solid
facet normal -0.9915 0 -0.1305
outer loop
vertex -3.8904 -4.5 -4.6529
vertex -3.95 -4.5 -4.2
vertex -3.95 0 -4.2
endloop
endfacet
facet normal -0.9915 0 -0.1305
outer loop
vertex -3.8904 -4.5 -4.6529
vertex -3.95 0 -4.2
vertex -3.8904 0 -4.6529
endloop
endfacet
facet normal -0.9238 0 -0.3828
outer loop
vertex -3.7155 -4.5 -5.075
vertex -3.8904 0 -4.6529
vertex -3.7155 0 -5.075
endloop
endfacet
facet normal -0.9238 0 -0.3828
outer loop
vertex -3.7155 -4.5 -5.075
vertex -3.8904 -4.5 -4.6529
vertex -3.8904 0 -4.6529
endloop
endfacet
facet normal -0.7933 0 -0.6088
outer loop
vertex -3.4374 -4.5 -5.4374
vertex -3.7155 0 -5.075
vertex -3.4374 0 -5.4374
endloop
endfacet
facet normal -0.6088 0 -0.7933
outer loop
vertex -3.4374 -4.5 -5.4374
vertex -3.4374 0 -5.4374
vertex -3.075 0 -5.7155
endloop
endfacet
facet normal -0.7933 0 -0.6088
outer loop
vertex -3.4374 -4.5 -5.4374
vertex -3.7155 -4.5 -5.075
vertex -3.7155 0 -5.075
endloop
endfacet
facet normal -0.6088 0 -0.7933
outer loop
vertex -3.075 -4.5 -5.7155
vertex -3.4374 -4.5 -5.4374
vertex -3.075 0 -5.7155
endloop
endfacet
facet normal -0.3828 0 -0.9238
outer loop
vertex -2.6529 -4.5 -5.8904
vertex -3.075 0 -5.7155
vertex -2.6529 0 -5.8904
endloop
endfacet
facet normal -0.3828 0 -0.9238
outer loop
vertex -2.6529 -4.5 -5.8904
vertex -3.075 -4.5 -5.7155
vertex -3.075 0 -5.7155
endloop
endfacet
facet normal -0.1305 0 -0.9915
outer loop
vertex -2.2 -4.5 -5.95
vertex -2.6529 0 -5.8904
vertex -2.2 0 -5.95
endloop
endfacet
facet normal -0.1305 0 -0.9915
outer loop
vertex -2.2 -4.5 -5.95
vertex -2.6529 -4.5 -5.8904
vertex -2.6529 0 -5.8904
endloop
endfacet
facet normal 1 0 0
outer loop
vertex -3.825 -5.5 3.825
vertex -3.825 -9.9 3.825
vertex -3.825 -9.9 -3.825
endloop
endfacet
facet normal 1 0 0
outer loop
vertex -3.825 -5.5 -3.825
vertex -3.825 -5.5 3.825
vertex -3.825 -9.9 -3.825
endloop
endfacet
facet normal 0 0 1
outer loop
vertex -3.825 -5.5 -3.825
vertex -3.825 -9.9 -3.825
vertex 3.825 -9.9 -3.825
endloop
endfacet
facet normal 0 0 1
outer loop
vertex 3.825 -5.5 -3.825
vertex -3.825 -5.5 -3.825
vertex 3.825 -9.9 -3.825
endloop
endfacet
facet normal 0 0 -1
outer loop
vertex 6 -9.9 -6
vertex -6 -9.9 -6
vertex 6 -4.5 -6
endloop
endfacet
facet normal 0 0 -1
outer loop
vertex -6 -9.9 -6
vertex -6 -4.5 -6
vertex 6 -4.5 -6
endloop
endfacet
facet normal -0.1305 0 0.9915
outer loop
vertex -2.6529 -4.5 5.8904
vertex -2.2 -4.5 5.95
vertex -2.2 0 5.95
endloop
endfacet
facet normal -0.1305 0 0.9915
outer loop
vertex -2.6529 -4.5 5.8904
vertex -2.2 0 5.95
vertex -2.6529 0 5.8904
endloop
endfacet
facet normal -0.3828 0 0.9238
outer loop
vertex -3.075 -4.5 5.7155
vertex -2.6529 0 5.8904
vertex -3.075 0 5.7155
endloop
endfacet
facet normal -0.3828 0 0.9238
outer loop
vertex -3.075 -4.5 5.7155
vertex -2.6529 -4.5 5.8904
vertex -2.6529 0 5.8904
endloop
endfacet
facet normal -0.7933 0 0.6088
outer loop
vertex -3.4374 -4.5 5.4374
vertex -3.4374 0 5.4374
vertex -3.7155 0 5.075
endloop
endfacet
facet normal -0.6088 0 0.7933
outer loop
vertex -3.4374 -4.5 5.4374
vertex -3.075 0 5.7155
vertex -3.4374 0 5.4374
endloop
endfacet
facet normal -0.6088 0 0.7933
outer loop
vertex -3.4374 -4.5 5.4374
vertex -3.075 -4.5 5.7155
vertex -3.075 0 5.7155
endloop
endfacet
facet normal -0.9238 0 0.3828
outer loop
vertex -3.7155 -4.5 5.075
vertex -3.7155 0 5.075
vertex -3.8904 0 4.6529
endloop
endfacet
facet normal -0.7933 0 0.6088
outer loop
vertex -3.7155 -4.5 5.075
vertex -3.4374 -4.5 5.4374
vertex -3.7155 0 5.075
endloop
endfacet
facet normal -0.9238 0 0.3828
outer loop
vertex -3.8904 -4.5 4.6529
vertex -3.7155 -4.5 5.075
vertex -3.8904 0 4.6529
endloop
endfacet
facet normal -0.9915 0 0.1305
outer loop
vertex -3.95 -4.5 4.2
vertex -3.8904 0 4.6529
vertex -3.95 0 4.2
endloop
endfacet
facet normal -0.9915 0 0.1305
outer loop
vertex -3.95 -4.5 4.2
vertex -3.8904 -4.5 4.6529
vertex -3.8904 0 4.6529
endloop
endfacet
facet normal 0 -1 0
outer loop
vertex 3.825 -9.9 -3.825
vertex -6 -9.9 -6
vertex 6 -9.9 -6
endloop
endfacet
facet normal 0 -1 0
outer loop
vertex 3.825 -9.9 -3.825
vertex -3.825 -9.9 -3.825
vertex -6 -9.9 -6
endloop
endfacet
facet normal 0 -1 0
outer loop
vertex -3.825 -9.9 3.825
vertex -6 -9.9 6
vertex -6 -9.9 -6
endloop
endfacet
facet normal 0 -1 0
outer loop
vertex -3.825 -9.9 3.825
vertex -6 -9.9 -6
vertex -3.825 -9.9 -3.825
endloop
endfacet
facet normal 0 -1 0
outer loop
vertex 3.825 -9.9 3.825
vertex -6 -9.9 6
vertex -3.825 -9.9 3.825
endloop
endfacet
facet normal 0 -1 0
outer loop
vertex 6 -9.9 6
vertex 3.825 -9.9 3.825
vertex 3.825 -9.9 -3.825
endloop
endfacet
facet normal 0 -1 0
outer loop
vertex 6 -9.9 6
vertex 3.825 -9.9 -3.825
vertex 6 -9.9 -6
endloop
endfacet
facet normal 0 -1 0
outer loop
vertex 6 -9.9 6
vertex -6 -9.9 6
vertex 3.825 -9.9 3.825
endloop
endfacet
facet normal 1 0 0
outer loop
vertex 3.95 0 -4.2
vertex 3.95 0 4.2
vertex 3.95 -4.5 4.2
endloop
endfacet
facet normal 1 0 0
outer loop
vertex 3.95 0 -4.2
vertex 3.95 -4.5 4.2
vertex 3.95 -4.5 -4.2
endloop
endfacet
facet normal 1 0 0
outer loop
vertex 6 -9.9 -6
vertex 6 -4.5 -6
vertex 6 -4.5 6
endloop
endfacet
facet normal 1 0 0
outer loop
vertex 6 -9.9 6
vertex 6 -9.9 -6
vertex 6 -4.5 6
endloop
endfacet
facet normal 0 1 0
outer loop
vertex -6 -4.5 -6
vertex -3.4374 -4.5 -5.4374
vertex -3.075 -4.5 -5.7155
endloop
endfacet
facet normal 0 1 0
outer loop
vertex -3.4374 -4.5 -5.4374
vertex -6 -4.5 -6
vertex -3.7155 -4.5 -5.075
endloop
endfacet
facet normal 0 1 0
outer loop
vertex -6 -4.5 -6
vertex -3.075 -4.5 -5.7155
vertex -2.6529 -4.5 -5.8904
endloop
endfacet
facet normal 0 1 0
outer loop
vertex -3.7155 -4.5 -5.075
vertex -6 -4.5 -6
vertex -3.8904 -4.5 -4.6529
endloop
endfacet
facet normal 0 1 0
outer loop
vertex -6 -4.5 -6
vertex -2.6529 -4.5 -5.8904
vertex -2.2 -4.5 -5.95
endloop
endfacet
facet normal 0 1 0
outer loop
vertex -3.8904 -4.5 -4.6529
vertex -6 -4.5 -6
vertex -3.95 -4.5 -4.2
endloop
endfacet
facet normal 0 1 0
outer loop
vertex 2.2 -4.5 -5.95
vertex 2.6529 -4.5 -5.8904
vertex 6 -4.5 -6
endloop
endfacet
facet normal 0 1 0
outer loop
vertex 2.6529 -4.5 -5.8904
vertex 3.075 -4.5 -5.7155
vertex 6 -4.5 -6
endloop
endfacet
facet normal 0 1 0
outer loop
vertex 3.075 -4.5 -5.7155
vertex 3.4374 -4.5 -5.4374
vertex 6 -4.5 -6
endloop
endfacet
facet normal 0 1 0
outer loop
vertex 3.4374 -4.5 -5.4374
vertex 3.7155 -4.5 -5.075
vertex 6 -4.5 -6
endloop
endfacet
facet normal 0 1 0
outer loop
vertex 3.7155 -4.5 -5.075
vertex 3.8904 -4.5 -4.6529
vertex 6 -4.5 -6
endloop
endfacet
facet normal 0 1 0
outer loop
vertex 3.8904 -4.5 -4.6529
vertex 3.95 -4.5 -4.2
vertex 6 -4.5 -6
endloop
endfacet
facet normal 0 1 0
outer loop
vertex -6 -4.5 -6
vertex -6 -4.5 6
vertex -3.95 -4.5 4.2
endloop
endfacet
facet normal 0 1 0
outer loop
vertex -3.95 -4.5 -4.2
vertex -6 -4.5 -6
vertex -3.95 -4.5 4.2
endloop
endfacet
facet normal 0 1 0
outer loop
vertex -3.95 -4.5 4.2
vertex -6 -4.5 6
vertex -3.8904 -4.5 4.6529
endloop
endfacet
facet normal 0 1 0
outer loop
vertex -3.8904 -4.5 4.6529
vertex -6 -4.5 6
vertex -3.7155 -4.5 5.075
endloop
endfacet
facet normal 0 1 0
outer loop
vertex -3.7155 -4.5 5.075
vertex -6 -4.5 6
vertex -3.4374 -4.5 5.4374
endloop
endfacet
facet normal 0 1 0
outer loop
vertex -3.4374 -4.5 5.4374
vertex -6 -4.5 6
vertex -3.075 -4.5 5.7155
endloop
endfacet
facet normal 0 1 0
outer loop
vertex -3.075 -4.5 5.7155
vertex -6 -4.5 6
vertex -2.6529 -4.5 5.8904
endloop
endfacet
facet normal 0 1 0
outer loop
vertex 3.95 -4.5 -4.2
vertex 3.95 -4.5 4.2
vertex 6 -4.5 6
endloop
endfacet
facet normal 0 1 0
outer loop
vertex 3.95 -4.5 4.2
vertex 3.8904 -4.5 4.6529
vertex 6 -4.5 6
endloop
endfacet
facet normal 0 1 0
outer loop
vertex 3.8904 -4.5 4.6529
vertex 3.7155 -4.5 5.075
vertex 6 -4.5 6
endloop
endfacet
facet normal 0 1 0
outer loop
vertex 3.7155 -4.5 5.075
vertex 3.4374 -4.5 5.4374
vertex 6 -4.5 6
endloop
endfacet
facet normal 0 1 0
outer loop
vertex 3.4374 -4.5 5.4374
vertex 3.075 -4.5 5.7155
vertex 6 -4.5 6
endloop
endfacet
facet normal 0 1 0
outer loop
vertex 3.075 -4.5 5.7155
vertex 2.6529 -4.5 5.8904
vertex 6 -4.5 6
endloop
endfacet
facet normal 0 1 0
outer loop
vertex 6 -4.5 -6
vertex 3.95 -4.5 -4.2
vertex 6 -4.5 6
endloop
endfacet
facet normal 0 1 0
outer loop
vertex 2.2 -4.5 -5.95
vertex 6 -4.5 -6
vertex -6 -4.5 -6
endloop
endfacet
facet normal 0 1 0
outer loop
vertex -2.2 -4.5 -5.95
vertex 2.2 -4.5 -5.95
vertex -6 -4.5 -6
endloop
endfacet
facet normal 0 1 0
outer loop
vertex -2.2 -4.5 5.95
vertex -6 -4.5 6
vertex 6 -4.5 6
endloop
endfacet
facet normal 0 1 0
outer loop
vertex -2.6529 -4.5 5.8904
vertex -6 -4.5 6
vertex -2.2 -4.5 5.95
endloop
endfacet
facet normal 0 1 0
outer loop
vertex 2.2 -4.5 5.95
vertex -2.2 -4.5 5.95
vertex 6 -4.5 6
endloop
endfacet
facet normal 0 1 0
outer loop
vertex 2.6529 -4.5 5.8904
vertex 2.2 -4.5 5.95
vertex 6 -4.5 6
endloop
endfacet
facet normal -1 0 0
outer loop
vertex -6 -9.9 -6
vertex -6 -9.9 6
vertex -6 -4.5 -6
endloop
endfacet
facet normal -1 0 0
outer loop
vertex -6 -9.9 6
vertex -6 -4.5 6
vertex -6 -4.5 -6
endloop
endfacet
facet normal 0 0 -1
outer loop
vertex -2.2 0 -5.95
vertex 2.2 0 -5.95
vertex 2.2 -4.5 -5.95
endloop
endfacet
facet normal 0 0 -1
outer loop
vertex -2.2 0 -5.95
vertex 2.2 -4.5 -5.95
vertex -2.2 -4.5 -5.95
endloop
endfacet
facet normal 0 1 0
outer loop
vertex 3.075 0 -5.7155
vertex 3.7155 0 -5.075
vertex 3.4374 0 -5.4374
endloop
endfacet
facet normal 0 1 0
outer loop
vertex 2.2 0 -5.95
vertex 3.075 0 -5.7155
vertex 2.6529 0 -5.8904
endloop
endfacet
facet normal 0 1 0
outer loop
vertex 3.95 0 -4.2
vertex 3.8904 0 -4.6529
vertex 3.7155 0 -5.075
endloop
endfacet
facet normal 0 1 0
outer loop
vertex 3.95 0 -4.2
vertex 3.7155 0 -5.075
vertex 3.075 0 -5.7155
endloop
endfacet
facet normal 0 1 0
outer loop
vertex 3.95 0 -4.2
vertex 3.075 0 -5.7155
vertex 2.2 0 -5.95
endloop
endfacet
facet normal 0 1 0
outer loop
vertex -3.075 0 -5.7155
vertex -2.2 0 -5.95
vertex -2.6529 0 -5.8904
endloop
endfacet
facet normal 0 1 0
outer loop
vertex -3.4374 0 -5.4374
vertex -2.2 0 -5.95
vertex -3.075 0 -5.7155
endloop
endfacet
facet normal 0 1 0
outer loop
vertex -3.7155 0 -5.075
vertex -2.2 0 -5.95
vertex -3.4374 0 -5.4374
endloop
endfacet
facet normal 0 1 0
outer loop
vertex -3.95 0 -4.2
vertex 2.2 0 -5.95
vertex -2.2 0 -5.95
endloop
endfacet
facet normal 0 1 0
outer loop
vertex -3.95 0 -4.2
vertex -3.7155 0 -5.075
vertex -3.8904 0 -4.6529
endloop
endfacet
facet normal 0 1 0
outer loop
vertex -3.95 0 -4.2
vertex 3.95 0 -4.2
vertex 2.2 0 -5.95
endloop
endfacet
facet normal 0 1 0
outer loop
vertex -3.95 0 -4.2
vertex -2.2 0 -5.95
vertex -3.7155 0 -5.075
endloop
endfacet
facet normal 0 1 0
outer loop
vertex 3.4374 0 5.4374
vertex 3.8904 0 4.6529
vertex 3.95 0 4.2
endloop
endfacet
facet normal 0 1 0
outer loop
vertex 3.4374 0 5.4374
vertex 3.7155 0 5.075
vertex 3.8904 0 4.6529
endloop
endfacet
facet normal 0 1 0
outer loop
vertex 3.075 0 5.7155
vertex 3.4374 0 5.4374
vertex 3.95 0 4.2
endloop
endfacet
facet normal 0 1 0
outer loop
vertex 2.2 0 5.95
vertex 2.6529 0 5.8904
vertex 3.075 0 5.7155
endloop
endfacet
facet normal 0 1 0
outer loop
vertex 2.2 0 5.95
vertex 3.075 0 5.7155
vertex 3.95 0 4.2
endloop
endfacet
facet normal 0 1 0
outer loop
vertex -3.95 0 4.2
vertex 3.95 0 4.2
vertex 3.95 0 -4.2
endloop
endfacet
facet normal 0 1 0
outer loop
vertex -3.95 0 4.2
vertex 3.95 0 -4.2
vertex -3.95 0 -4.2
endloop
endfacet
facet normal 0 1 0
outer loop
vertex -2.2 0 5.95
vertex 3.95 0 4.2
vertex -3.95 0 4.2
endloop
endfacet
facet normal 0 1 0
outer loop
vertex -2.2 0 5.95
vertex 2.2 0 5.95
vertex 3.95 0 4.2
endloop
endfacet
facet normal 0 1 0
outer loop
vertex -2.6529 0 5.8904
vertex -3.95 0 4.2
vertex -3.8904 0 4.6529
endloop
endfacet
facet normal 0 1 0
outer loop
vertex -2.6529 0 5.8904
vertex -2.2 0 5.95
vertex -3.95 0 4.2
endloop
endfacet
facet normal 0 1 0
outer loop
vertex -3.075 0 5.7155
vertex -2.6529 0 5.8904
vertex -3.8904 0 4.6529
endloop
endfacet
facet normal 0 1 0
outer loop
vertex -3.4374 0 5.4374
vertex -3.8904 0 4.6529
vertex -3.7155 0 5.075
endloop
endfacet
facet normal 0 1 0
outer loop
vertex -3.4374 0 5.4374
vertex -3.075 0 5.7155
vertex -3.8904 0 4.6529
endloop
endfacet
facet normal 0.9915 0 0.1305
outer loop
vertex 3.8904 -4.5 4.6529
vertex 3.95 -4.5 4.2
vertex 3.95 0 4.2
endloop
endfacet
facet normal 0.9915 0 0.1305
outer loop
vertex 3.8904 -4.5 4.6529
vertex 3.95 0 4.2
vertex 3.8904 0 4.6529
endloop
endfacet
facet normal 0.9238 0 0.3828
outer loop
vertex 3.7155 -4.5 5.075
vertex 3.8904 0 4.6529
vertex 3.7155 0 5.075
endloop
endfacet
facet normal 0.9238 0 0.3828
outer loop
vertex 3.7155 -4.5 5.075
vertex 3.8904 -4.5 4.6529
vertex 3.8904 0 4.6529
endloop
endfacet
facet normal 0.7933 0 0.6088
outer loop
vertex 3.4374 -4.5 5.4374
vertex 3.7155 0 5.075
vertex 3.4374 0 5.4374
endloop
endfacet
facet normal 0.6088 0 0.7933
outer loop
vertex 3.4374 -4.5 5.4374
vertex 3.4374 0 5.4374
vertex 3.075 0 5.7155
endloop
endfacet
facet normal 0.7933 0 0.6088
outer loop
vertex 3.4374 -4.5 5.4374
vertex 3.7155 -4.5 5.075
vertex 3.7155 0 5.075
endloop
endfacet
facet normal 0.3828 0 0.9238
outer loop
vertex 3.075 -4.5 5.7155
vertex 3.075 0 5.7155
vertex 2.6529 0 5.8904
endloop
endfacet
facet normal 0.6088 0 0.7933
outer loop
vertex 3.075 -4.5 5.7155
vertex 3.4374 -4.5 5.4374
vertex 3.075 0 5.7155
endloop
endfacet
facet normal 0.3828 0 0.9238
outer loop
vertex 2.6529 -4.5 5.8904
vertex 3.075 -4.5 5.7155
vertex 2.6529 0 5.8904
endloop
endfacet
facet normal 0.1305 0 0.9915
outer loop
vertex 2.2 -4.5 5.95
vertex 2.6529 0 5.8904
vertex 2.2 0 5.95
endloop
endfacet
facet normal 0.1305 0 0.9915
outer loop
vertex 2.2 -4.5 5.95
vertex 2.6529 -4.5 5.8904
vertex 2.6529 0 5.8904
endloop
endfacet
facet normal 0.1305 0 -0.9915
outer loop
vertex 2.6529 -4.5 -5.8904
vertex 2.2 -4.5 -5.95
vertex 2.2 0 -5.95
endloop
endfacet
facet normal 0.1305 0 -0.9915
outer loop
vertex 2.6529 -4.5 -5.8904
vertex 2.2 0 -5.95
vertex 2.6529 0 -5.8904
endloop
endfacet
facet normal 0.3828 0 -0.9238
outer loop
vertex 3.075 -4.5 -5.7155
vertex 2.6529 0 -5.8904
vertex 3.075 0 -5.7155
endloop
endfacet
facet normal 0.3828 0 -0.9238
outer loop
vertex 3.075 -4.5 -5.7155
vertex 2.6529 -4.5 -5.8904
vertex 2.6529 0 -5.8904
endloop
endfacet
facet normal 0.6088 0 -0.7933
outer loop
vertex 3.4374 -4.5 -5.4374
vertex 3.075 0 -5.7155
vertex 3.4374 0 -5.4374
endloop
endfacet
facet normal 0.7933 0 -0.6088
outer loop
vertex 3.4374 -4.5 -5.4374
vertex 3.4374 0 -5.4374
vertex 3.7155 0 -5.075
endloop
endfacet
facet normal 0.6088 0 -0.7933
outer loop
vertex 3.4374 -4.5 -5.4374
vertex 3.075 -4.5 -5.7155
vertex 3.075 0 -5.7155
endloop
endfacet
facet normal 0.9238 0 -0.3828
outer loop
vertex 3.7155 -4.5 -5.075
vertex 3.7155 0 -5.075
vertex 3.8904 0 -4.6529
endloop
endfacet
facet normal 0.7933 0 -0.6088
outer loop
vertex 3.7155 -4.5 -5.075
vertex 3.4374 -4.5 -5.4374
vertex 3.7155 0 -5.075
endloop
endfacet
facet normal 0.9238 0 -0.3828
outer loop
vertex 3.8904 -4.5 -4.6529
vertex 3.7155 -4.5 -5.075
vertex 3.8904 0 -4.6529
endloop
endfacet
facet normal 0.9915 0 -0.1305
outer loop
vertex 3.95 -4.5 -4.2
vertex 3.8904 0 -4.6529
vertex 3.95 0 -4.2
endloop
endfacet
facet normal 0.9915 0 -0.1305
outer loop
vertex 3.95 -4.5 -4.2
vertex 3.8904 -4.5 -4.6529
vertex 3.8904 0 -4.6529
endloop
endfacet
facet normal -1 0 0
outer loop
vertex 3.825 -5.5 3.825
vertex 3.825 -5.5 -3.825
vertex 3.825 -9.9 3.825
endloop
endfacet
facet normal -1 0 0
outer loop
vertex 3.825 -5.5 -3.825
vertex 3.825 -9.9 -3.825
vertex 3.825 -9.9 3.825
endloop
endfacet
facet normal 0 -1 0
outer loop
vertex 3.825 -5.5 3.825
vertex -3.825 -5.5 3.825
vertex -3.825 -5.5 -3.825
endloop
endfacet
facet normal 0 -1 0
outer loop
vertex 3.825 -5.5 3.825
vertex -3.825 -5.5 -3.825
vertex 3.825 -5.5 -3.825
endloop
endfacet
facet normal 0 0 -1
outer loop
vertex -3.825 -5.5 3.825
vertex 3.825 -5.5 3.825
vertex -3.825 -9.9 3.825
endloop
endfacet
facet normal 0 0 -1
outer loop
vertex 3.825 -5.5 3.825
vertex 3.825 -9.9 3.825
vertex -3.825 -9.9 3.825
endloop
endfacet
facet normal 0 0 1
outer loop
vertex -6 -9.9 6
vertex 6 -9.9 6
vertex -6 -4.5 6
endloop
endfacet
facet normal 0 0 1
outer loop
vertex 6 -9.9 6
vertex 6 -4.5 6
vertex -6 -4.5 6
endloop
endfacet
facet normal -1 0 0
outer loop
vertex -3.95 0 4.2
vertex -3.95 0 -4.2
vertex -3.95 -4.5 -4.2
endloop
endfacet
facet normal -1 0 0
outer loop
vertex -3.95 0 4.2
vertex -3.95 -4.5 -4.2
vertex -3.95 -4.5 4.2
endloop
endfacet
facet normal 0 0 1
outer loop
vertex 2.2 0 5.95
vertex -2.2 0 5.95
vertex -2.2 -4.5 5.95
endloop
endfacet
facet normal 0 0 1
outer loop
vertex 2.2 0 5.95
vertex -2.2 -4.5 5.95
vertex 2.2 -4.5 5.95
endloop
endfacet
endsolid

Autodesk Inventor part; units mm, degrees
ref_plane "YZ Plane" through (0, 0, 0) normal (1, 0, 0) x (0, 1, 0)
ref_plane "XZ Plane" through (0, 0, 0) normal (0, 1, 0) x (-1, 0, 0)
ref_plane "XY Plane" through (0, 0, 0) normal (0, 0, 1) x (1, 0, 0)
sketch "Sketch1" plane through (0, 0, 0) normal (0, 1, 0) x (-1, 0, 0)
  point P0 (0, 0)
sketch "Sketch2" plane through (0, 0, 0) normal (0, 1, 0) x (-1, 0, 0)
  line L0 (3.95, 5.95) -> (-3.95, 5.95)
  line L1 (-3.95, 5.95) -> (-3.95, -5.95)
  line L2 (-3.95, -5.95) -> (3.95, -5.95)
  line L3 (3.95, -5.95) -> (3.95, 5.95)
  line L4 (3.95, 5.95) -> (-3.95, -5.95) construction
  line L5 (-3.95, 5.95) -> (3.95, -5.95) construction
  point P0 (0, 0)
  dimension "d0" = 7.9
  dimension "d1" = 11.9
extrude "Extrusion1" add sketch "Sketch2" against normal blind 4.5
fillet "Fillet1" radius 1.75 4 edges at (3.95, -2.25, 5.95) (3.95, -2.25, -5.95) (-3.95, -2.25, 5.95) (-3.95, -2.25, -5.95)
sketch "Sketch3" plane through (0, -4.5, 0) normal (0, -1, 0) x (1, 0, 0)
  line L0 (6, 6) -> (-6, 6)
  line L1 (-6, 6) -> (-6, -6)
  line L2 (-6, -6) -> (6, -6)
  line L3 (6, -6) -> (6, 6)
  line L4 (6, 6) -> (-6, -6) construction
  line L5 (-6, 6) -> (6, -6) construction
  point P0 (0, 0)
  dimension "d5" = 12
  dimension "d6" = 12
extrude "Extrusion2" add sketch "Sketch3" along normal blind 5.4
sketch "Sketch4" plane through (0, -9.9, 0) normal (0, -1, 0) x (1, 0, 0)
  line L0 (3.825, 3.825) -> (-3.825, 3.825)
  line L1 (-3.825, 3.825) -> (-3.825, -3.825)
  line L2 (-3.825, -3.825) -> (3.825, -3.825)
  line L3 (3.825, -3.825) -> (3.825, 3.825)
  line L4 (3.825, 3.825) -> (-3.825, -3.825) construction
  line L5 (-3.825, 3.825) -> (3.825, -3.825) construction
  point P0 (0, 0)
  dimension "d9" = 7.65
  dimension "d10" = 7.65
extrude "Extrusion3" cut sketch "Sketch4" against normal blind 4.4
properties part number "blank button_3DPrint"
